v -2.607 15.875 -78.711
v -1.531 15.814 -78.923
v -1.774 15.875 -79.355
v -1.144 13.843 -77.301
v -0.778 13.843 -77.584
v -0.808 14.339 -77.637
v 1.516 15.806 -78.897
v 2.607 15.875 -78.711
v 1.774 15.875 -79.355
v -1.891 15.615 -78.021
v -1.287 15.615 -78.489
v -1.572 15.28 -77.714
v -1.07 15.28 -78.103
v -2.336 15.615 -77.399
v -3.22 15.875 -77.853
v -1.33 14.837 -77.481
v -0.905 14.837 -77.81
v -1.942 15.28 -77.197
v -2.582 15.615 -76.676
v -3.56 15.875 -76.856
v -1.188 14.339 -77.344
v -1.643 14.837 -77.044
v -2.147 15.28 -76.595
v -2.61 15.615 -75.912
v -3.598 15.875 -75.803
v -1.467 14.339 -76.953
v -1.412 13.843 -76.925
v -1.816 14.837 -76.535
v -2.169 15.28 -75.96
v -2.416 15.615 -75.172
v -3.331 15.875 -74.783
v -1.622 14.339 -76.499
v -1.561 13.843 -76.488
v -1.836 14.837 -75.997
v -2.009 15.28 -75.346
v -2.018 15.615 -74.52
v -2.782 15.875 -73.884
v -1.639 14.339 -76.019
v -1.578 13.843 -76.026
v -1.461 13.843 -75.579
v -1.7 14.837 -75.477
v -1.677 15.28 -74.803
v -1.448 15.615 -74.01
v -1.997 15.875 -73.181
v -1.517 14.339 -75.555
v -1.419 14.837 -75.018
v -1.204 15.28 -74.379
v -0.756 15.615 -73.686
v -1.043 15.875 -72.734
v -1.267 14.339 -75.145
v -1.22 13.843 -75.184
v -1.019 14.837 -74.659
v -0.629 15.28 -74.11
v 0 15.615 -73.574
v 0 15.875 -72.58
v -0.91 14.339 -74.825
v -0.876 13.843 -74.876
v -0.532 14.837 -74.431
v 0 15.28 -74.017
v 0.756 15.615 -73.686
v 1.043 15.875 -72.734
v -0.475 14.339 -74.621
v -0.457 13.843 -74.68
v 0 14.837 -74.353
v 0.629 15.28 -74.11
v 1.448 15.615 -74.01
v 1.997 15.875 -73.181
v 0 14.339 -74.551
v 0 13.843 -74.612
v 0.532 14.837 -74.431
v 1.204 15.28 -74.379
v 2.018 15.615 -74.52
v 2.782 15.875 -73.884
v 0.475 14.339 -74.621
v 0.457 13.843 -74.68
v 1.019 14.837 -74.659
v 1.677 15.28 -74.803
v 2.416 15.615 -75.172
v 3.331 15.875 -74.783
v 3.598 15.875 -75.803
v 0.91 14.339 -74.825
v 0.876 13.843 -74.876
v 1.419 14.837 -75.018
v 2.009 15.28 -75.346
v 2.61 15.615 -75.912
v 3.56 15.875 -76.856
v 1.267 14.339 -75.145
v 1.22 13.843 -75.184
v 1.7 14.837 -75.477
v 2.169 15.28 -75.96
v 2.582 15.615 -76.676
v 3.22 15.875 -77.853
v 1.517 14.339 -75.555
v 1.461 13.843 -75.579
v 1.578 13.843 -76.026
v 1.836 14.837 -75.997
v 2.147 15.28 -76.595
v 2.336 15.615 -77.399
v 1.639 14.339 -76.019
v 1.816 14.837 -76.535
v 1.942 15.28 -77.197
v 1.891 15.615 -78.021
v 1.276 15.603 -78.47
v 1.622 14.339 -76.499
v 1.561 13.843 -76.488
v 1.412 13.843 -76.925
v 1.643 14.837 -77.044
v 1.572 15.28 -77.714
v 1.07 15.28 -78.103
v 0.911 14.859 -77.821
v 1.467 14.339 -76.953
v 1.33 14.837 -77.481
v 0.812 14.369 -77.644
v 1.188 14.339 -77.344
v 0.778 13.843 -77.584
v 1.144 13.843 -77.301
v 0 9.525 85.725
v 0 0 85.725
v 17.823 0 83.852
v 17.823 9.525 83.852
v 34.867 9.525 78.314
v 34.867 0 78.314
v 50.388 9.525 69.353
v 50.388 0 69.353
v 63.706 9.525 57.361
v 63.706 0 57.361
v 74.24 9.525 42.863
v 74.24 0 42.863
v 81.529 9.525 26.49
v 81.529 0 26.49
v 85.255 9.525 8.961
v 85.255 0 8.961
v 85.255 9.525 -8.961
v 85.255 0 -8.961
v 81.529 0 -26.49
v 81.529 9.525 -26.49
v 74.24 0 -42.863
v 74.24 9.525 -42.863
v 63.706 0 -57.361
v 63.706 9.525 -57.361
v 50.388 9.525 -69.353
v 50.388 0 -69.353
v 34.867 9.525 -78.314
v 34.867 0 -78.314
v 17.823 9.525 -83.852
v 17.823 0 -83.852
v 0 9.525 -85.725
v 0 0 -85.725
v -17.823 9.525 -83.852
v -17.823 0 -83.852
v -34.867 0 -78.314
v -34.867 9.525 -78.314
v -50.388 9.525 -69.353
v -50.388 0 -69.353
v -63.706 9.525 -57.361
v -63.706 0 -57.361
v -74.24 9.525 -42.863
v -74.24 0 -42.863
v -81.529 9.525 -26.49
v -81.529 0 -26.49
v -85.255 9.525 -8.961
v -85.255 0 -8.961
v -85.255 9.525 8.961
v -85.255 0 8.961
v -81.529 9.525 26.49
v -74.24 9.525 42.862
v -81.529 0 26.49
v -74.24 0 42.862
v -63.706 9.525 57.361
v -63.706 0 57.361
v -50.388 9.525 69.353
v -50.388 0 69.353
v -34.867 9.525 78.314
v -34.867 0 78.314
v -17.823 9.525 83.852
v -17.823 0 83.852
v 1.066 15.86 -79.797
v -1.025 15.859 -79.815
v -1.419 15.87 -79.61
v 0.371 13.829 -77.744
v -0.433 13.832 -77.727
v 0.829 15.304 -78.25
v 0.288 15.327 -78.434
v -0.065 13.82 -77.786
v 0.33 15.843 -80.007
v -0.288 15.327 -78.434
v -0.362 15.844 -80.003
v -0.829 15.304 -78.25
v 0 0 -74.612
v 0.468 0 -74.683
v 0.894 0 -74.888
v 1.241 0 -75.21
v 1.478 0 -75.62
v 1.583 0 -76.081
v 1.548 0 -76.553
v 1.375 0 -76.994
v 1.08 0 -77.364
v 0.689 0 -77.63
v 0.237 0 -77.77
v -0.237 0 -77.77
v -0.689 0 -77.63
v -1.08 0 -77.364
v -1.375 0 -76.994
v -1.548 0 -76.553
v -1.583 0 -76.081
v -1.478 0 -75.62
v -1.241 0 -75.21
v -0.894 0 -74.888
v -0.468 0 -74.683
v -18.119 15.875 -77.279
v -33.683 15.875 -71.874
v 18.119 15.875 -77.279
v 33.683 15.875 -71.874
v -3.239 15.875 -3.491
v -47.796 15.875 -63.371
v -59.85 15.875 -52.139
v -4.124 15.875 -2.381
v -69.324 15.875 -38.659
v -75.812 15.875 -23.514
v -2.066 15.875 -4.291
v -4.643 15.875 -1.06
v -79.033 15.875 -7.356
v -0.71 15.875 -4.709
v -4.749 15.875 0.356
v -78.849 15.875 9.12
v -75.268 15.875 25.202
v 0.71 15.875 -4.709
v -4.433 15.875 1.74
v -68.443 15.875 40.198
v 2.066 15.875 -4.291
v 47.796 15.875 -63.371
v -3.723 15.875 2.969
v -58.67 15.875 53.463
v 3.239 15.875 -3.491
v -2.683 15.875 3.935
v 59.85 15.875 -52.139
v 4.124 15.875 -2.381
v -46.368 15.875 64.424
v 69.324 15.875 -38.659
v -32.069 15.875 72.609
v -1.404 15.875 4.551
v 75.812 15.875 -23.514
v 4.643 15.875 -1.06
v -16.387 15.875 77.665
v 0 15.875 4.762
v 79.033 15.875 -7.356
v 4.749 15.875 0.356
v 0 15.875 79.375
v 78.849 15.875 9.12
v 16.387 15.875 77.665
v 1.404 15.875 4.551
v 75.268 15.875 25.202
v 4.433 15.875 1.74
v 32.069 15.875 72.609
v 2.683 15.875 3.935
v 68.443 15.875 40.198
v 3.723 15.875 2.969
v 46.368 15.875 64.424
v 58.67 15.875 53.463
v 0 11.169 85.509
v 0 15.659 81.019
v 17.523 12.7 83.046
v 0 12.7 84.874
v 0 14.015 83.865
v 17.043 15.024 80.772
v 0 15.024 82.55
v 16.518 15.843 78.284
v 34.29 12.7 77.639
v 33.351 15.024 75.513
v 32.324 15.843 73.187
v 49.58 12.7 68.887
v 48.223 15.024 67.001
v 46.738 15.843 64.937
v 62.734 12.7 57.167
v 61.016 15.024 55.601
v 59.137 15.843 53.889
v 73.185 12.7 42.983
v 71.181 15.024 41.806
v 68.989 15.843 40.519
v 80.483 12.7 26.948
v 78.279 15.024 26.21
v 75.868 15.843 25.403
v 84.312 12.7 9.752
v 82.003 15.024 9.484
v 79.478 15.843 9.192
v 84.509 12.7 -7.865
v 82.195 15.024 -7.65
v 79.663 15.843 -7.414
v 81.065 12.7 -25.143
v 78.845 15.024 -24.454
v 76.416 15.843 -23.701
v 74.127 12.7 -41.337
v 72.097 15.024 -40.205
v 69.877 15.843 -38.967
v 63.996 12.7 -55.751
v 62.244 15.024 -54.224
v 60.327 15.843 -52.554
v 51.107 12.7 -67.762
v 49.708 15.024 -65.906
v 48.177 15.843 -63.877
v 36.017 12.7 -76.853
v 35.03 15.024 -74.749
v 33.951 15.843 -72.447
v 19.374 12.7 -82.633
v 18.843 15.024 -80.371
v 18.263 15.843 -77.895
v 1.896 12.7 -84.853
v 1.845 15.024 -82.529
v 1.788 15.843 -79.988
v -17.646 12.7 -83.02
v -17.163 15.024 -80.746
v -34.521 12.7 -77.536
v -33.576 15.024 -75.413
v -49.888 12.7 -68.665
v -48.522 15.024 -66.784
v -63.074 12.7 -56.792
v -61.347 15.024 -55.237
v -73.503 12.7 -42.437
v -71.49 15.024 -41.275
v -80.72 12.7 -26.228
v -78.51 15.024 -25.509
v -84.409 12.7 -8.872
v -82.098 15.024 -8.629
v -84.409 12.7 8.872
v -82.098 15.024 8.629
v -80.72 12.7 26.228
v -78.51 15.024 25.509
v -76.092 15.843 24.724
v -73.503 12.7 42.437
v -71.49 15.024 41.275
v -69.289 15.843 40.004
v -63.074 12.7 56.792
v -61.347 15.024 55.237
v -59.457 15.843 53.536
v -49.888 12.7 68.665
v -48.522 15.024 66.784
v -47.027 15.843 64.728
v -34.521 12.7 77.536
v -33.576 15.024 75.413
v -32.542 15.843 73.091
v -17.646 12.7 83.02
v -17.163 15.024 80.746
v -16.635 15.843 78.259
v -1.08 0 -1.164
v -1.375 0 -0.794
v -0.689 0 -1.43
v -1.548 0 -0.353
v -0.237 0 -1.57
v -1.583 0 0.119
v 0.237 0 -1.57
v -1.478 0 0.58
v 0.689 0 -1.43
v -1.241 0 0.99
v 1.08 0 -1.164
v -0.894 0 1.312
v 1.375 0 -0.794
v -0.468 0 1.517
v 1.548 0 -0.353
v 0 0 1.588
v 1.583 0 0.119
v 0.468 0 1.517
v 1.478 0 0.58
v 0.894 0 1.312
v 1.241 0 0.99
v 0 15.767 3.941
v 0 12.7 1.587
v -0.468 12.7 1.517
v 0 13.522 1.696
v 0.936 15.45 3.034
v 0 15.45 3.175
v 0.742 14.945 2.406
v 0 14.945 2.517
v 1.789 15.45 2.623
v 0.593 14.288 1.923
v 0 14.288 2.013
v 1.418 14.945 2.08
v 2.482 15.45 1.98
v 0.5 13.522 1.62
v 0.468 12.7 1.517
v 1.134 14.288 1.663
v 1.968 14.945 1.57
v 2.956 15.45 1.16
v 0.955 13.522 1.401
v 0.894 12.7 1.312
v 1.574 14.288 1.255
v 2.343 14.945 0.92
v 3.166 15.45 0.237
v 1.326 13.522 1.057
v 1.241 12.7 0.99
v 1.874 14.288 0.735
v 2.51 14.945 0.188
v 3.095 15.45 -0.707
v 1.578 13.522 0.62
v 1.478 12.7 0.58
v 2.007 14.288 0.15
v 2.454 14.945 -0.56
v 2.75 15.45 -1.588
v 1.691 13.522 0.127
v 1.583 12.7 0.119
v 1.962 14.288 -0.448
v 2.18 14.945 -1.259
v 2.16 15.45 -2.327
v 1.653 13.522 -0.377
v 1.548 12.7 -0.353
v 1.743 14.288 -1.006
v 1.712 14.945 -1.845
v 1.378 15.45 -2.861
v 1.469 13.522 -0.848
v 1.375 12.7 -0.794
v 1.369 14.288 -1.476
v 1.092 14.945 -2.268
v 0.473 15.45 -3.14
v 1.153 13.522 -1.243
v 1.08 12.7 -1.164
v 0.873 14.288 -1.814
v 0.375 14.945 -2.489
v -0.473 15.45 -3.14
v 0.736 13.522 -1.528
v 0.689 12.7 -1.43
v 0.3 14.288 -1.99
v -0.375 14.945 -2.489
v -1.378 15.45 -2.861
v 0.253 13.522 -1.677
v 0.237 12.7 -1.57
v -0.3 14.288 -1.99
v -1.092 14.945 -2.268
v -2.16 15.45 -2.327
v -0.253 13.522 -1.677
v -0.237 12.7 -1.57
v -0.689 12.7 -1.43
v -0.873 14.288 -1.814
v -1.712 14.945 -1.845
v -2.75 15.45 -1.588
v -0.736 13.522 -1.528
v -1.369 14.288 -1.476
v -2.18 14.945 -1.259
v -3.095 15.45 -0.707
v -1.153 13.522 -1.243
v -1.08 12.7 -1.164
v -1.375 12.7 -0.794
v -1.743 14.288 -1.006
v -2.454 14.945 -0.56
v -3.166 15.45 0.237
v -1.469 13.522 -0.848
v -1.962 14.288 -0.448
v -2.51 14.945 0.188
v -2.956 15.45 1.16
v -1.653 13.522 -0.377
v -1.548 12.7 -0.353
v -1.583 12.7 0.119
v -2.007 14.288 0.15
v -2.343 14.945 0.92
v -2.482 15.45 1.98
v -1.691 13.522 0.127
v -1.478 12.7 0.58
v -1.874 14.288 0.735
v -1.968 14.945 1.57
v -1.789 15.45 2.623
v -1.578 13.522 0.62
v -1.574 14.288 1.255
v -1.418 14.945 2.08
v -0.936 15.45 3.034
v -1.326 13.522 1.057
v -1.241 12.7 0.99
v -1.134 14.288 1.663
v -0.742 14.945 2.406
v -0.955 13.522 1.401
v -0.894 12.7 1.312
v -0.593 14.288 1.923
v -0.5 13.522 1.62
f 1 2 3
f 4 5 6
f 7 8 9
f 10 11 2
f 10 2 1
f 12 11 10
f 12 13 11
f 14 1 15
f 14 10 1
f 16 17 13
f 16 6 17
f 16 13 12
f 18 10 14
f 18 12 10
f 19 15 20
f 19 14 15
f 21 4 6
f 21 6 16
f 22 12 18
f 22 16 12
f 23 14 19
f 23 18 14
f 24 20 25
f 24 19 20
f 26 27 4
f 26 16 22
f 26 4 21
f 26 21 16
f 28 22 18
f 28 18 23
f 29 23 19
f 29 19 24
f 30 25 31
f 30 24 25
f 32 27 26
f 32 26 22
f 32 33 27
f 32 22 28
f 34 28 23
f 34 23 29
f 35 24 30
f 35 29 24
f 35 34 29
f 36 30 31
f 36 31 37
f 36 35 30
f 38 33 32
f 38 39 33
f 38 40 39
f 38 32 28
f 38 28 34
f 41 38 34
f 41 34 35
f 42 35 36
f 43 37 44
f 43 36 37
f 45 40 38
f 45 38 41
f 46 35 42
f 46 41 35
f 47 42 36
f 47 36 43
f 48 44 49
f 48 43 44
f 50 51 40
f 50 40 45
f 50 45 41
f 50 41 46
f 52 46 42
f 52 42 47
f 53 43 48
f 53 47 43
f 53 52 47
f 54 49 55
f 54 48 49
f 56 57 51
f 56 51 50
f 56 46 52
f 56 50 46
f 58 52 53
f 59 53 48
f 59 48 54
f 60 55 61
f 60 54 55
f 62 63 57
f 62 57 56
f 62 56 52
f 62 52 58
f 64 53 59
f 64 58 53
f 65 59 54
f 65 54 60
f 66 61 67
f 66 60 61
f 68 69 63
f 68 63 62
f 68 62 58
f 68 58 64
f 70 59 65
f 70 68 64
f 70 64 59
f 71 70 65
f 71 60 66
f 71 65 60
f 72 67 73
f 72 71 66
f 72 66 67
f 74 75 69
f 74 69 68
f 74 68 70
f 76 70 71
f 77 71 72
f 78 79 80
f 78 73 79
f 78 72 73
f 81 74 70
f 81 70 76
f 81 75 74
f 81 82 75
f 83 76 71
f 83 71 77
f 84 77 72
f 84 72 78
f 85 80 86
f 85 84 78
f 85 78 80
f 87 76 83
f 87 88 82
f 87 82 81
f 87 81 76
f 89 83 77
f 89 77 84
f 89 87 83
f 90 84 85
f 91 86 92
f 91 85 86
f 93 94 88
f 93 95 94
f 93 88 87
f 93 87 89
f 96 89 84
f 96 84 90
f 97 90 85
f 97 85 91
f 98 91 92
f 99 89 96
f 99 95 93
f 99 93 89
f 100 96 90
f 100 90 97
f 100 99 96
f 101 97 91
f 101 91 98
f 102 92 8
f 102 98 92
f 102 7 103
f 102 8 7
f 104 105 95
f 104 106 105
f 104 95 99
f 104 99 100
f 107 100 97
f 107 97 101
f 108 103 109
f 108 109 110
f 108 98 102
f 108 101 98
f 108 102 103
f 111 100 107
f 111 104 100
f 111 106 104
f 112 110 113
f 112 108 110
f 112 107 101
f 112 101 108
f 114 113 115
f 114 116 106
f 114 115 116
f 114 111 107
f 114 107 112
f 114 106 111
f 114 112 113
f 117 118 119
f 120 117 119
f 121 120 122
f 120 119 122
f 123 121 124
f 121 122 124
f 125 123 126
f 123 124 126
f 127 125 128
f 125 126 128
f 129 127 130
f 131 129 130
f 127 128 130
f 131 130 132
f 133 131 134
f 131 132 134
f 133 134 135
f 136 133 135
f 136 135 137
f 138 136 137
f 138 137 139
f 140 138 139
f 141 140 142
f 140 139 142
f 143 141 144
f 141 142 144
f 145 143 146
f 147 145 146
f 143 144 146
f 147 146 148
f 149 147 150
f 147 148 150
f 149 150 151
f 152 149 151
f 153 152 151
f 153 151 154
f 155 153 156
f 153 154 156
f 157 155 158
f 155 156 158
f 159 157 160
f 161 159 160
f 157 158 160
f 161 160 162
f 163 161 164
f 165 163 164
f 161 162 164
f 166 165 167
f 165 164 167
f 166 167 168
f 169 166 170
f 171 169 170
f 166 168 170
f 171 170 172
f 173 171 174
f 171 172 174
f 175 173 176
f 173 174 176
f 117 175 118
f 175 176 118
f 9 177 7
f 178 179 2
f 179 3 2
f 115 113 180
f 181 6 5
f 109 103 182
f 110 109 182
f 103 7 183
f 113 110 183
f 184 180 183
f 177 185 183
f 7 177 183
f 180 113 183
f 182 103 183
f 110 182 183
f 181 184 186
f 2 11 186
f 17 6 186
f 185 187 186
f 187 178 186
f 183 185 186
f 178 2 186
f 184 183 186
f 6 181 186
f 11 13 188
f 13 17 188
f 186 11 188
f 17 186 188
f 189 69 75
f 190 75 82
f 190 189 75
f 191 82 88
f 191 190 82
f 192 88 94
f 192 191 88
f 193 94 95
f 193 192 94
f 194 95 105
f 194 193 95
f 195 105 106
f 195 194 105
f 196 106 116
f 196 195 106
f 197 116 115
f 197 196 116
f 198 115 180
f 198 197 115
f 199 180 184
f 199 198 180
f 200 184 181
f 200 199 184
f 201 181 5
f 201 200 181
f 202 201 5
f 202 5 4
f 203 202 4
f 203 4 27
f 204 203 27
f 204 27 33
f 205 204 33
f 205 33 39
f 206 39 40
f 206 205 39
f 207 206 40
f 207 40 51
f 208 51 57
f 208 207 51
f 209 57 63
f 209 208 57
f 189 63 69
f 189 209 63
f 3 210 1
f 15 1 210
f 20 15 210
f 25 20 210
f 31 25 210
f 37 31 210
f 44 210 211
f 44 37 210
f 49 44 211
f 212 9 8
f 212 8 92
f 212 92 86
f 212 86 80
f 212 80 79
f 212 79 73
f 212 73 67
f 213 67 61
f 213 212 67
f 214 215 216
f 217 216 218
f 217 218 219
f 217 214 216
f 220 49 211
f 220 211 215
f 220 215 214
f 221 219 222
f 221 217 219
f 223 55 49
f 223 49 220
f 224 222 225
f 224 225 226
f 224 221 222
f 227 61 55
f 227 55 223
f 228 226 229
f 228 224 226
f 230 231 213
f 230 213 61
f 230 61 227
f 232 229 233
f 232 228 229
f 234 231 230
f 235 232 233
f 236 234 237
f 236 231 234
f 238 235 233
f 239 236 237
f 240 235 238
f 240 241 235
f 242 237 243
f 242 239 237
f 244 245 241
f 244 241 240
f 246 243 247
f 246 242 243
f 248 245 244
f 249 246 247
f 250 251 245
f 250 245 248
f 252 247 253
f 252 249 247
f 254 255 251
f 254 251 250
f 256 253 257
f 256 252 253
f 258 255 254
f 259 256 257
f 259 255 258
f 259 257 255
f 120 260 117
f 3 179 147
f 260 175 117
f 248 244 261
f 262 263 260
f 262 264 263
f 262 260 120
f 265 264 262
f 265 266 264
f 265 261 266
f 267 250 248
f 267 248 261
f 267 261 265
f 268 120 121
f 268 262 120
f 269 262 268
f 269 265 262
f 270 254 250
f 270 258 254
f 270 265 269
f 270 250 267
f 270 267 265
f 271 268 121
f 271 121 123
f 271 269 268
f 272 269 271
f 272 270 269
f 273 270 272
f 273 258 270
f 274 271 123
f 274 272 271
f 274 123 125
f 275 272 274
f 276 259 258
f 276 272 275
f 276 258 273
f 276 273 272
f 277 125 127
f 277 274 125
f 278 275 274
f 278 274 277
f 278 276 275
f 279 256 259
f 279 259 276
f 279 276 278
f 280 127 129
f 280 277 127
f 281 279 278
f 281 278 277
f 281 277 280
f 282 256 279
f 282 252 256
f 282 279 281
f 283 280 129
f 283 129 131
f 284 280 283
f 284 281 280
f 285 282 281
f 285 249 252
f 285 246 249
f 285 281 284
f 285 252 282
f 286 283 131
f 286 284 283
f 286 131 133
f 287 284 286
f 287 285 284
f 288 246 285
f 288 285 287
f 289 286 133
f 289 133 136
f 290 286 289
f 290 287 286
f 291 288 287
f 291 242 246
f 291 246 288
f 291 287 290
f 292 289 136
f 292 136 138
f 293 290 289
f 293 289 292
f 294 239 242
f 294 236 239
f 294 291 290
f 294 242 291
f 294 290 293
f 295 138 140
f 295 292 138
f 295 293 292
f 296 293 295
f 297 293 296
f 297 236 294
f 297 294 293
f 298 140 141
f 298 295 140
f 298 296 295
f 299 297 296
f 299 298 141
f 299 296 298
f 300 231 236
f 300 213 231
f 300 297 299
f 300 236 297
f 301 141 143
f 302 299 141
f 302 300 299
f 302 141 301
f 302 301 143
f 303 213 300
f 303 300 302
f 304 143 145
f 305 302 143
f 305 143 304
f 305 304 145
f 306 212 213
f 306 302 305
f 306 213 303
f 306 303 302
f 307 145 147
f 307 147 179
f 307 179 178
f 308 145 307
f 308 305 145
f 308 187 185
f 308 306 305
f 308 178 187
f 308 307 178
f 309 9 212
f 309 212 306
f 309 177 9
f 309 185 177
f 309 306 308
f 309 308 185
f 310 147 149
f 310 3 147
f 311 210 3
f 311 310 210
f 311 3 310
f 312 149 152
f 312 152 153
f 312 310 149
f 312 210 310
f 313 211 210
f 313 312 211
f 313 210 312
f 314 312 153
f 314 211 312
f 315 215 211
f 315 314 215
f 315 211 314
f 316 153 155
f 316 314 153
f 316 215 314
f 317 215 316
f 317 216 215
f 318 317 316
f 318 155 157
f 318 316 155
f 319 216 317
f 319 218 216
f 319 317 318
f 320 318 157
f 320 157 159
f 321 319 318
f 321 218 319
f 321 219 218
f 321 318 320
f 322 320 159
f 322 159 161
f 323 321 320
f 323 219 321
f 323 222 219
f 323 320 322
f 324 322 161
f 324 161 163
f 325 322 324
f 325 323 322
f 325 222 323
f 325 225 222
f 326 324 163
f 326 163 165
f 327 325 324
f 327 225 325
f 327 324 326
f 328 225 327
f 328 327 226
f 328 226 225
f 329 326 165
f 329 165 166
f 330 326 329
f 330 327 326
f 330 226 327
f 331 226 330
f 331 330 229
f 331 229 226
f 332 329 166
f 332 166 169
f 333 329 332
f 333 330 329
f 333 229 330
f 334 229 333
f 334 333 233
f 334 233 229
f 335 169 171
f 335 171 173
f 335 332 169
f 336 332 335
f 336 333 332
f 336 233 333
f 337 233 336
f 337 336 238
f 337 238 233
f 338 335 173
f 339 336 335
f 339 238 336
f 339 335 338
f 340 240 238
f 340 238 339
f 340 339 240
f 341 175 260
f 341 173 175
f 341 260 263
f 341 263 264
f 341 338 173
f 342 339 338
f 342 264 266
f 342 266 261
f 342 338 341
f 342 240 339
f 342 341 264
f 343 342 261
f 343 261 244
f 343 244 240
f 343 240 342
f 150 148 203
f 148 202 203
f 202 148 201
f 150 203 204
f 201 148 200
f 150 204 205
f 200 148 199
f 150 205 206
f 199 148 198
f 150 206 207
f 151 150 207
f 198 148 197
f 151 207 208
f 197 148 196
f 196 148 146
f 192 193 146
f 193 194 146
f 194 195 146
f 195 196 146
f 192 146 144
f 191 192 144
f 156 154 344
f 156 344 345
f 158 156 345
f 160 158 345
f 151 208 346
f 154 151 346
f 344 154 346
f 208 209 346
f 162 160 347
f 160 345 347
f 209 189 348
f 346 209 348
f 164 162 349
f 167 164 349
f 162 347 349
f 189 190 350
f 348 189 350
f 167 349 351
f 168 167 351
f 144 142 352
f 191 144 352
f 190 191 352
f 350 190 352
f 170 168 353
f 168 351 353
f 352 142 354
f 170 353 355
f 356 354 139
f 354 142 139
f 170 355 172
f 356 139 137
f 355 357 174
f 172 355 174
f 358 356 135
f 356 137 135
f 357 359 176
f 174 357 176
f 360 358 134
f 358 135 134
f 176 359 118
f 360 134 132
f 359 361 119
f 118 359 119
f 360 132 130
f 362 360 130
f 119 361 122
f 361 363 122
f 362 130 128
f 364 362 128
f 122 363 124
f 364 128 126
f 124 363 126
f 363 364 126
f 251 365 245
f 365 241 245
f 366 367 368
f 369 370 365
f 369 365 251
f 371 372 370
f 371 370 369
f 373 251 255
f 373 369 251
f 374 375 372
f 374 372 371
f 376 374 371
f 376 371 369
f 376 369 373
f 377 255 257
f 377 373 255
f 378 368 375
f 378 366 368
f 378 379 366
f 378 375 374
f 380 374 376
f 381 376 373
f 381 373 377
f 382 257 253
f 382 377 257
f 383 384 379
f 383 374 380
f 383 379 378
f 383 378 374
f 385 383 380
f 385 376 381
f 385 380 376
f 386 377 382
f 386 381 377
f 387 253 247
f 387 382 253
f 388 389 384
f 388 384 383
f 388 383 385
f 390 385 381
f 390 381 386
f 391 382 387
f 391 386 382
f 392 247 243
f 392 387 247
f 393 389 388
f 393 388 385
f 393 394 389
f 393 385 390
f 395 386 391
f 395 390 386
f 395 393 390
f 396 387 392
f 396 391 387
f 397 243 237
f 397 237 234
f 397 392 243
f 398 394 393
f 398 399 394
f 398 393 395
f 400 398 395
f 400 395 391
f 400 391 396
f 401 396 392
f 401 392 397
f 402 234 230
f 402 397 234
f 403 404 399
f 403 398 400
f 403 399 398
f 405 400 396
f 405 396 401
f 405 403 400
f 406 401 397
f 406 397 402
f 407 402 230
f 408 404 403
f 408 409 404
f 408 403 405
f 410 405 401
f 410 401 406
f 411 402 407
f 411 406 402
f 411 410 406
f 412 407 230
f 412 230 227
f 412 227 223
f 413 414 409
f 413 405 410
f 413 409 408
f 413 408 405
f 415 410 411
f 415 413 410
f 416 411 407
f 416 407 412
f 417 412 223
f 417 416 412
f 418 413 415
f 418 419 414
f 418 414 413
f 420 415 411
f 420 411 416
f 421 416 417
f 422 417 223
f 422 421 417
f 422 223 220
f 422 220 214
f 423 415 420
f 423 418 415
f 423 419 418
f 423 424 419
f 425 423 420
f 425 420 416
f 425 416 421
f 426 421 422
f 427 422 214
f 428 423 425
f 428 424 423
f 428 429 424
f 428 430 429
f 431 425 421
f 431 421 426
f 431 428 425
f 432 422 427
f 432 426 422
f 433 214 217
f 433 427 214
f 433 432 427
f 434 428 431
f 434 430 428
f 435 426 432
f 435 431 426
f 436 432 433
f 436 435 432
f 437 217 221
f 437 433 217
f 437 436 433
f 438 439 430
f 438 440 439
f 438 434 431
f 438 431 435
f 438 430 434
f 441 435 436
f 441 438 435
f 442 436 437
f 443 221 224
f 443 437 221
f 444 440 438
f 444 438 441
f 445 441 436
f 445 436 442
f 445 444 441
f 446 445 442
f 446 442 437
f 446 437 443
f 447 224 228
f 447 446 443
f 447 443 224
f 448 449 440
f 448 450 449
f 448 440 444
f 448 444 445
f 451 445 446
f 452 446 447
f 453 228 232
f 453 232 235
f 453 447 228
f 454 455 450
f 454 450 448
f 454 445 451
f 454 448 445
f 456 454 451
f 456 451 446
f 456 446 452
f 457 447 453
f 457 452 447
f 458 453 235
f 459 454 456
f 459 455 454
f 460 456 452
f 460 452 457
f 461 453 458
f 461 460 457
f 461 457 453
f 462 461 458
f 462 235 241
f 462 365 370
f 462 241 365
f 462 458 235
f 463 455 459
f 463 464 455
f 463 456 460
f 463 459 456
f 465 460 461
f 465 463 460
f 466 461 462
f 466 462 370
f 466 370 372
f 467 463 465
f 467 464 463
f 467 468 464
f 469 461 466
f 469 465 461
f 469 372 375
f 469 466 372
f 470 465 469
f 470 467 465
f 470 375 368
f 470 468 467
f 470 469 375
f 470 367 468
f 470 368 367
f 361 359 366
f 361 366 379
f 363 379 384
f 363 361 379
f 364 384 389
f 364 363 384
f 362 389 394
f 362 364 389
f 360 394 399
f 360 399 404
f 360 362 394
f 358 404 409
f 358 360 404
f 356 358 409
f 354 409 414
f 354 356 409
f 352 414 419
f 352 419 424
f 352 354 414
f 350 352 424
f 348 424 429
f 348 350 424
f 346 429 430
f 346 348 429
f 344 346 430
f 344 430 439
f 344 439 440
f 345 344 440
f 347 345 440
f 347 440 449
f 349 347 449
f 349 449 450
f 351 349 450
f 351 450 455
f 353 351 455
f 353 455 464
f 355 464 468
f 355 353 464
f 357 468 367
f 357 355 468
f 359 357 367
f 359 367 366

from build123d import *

# Parameters (mm, degrees)
SKETCH3_R          = 85.725
SKETCH3_R_2        = 1.5875
BASE_EXTRUDE_DEPTH = 15.875
FILLET2_R          = 6.35
FILLET3_R          = 3.175
FILLET4_R          = 2.032


with BuildPart() as part:
    # Sketch3 → Base-Extrude (new body)
    with BuildSketch(Plane(origin=(0, 0, 0), x_dir=(1, 0, 0), z_dir=(0, 1, 0))):
        with Locations(Location((0, 0, 0), (0, 0, 270))):
            Circle(SKETCH3_R)
        with Locations(Location((0, 0, 0), (0, 0, 270))):
            Circle(SKETCH3_R_2, mode=Mode.SUBTRACT)
        with Locations(Location((0, 76.2, 0), (0, 0, 270))):
            Circle(SKETCH3_R_2, mode=Mode.SUBTRACT)
    extrude(amount=BASE_EXTRUDE_DEPTH)

    # Fillet2
    fillet2_edges = [part.edges().sort_by_distance(p)[0] for p in [
        (0, 15.875, -85.725),
    ]]
    fillet(fillet2_edges, radius=FILLET2_R)

    # Fillet3
    fillet3_edges = [part.edges().sort_by_distance(p)[0] for p in [
        (0, 15.875, -1.5875),
    ]]
    fillet(fillet3_edges, radius=FILLET3_R)

    # Fillet4
    fillet4_edges = [part.edges().sort_by_distance(p)[0] for p in [
        (0, 15.875, -77.7875),
    ]]
    fillet(fillet4_edges, radius=FILLET4_R)


solid = part.part
